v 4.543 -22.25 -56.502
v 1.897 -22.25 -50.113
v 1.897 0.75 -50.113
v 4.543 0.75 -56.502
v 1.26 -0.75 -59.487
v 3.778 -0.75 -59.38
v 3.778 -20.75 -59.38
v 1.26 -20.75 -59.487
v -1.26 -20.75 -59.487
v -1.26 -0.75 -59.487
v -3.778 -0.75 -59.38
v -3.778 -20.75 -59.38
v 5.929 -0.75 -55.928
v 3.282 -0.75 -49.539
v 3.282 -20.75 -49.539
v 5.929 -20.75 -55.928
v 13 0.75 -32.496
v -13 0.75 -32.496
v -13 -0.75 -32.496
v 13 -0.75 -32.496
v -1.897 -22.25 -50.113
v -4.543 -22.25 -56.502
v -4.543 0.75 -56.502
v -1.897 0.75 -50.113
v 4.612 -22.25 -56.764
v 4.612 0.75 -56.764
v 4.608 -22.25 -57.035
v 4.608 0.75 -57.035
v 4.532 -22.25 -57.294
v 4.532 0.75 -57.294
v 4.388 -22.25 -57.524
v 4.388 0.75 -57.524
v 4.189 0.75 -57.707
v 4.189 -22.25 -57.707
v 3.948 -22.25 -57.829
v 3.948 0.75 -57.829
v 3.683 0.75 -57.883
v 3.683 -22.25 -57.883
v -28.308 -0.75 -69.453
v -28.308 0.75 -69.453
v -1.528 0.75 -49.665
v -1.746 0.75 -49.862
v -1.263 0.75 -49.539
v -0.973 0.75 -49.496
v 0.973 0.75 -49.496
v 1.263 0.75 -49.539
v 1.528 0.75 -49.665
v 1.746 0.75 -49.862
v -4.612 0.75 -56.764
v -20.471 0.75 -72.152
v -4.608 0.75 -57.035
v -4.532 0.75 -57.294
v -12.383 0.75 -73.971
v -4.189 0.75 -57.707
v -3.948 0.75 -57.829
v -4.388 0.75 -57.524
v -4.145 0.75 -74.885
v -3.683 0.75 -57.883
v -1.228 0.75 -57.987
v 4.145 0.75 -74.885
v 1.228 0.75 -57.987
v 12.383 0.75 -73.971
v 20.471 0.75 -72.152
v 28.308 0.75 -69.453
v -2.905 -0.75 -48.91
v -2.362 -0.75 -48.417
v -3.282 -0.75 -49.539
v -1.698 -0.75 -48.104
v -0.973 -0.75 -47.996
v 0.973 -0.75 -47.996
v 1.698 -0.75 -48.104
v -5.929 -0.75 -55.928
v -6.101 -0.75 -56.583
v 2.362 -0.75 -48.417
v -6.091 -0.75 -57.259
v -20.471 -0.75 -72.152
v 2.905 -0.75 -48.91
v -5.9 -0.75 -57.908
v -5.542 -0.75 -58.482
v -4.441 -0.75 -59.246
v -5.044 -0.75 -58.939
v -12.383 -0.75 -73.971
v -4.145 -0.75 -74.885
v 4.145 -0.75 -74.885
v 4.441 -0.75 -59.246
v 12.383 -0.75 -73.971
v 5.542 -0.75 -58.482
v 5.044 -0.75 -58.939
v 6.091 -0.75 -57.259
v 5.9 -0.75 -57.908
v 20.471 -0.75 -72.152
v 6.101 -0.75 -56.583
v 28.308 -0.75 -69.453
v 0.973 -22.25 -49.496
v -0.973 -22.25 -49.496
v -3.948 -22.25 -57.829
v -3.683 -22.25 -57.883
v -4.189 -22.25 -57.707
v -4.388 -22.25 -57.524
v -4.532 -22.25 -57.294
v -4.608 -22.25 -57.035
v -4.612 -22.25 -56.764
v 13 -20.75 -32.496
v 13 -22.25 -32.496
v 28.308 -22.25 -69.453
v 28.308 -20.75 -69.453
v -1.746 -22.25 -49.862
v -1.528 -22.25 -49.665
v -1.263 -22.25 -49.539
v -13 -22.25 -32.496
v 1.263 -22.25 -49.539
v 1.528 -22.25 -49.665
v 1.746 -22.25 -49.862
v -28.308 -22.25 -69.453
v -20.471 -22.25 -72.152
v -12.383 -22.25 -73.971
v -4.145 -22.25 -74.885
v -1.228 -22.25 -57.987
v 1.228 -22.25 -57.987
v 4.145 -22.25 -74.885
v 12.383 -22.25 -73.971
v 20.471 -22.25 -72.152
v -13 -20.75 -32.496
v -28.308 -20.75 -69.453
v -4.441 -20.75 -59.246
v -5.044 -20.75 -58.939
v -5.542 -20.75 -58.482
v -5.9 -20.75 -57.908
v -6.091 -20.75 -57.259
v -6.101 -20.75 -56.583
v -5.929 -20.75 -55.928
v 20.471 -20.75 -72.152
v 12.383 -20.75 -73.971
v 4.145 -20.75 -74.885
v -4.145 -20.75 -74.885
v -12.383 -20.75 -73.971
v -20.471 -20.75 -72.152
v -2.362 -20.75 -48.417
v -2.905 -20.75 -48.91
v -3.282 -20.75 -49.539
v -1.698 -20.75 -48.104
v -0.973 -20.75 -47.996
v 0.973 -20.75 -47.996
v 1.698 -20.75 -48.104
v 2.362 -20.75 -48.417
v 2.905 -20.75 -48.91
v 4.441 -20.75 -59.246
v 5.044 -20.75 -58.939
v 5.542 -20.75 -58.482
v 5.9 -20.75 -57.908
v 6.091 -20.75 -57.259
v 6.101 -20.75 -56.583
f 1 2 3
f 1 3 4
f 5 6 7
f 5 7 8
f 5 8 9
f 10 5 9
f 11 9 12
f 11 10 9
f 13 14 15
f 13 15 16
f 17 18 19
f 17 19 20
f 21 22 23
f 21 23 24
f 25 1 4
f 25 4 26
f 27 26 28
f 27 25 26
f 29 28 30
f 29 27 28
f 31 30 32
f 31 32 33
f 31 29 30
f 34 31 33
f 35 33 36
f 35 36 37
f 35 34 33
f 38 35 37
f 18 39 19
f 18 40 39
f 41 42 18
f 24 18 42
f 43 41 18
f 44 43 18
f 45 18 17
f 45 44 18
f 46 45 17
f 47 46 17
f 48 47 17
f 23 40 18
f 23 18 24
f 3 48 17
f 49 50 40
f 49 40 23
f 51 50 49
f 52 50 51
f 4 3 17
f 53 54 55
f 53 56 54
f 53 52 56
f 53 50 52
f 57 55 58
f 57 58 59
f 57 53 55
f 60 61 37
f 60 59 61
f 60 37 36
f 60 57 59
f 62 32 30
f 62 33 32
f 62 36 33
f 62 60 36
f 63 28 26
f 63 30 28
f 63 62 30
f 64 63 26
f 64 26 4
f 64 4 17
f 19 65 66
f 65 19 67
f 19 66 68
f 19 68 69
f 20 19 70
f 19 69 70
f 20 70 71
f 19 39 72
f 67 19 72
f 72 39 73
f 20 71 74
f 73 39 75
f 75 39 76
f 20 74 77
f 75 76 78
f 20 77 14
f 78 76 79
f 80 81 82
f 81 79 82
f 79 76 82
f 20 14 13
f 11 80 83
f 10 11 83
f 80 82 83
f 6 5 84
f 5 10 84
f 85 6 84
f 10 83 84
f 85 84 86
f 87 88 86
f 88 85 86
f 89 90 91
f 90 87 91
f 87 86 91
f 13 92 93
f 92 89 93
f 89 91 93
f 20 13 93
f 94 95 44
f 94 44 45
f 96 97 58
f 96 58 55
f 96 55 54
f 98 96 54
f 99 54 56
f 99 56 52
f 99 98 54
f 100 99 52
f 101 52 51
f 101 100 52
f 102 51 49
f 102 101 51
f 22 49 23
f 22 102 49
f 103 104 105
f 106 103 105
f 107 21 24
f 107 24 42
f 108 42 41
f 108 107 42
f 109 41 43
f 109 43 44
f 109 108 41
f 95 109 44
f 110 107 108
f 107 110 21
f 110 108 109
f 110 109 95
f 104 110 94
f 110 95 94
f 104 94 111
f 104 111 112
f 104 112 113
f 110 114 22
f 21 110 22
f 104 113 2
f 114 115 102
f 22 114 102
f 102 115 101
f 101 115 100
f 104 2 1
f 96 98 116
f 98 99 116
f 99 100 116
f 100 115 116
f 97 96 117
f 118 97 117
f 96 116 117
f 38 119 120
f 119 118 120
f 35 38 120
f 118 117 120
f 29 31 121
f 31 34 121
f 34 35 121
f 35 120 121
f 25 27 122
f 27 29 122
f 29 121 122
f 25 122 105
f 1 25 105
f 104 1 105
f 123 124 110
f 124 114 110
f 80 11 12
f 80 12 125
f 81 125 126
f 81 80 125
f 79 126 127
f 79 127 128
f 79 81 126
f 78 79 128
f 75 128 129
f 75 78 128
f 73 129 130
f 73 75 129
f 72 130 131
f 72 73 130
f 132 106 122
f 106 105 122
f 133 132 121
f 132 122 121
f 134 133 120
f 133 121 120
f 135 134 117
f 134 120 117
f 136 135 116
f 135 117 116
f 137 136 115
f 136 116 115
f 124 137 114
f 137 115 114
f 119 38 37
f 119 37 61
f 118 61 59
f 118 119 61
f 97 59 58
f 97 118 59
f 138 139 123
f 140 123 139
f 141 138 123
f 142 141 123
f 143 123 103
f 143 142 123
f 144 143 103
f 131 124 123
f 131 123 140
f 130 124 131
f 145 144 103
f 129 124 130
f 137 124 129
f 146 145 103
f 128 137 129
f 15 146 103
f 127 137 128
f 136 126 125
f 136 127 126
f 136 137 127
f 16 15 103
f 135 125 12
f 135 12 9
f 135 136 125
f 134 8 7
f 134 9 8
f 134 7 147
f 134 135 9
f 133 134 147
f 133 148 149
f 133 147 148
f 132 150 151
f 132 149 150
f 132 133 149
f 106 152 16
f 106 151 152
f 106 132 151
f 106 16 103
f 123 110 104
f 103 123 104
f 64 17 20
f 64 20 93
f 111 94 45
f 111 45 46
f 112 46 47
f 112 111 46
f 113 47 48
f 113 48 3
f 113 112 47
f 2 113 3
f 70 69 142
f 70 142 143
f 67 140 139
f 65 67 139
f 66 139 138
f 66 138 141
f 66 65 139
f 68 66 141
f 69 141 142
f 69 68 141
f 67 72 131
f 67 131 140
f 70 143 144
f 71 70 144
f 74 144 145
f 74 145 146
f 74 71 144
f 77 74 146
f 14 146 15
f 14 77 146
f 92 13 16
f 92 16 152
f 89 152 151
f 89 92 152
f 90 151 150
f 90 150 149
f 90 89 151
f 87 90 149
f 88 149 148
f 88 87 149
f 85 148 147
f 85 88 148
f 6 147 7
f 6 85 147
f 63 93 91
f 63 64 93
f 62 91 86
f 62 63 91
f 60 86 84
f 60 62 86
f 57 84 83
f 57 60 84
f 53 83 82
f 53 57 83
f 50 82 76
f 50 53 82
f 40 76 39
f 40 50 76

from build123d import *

# Parameters (mm, degrees)
BOSS_EXTRUDE1_DEPTH = 0.75
BOSS_EXTRUDE2_DEPTH = 20


with BuildPart() as part:
    # Sketch1 → Boss-Extrude1 (new, symmetric)
    with BuildSketch(Plane(origin=(0, 0, 0), x_dir=(1, 0, 0), z_dir=(0, 1, 0))):
        with BuildLine():
            Line((-28.307864731, 69.452608262), (-13, 32.496153619))
            Line((-13, 32.496153619), (13, 32.496153619))
            Line((13, 32.496153619), (28.307864731, 69.452608262))
            ThreePointArc((28.307864731, 69.452608262), (0, 75), (-28.307864731, 69.452608262))
        make_face()
        with BuildLine():
            Line((-4.543006128, 56.502305121), (-1.89666405, 50.113470186))
            ThreePointArc((-1.89666405, 50.113470186), (-1.52835475, 49.664684006), (-0.972784517, 49.496153619))
            Line((-0.972784517, 49.496153619), (0.972784517, 49.496153619))
            ThreePointArc((0.972784517, 49.496153619), (1.52835475, 49.664684006), (1.89666405, 50.113470186))
            Line((1.89666405, 50.113470186), (4.543006128, 56.502305121))
            ThreePointArc((4.543006128, 56.502305121), (4.467823117, 57.413868704), (3.682620044, 57.882970808))
            ThreePointArc((3.682620044, 57.882970808), (0, 58), (-3.682620044, 57.882970808))
            ThreePointArc((-3.682620044, 57.882970808), (-4.467823117, 57.413868704), (-4.543006128, 56.502305121))
        make_face(mode=Mode.SUBTRACT)
    boss_extrude1 = extrude(amount=BOSS_EXTRUDE1_DEPTH, both=True)

    # Sketch2 → Boss-Extrude2 (add)
    with BuildSketch(Plane.XZ.offset(0.75)):
        with BuildLine():
            Line((-0.972784517, -47.996153619), (0.972784517, -47.996153619))
            ThreePointArc((0.972784517, -47.996153619), (2.3617101, -48.417479588), (3.282483349, -49.539445038))
            Line((3.282483349, -49.539445038), (5.928825426, -55.928279972))
            ThreePointArc((5.928825426, -55.928279972), (5.7408679, -58.207188929), (3.777860218, -59.379944191))
            ThreePointArc((3.777860218, -59.379944191), (0, -59.5), (-3.777860218, -59.379944191))
            ThreePointArc((-3.777860218, -59.379944191), (-5.7408679, -58.207188929), (-5.928825426, -55.928279972))
            Line((-5.928825426, -55.928279972), (-3.282483349, -49.539445038))
            ThreePointArc((-3.282483349, -49.539445038), (-2.3617101, -48.417479588), (-0.972784517, -47.996153619))
        make_face()
        with BuildLine():
            Line((1.89666405, -50.113470186), (4.543006128, -56.502305121))
            ThreePointArc((4.543006128, -56.502305121), (4.467823117, -57.413868704), (3.682620044, -57.882970808))
            ThreePointArc((3.682620044, -57.882970808), (0, -58), (-3.682620044, -57.882970808))
            ThreePointArc((-3.682620044, -57.882970808), (-4.467823117, -57.413868704), (-4.543006128, -56.502305121))
            Line((-4.543006128, -56.502305121), (-1.89666405, -50.113470186))
            ThreePointArc((-1.89666405, -50.113470186), (-1.52835475, -49.664684006), (-0.972784517, -49.496153619))
            Line((-0.972784517, -49.496153619), (0.972784517, -49.496153619))
            ThreePointArc((0.972784517, -49.496153619), (1.52835475, -49.664684006), (1.89666405, -50.113470186))
        make_face(mode=Mode.SUBTRACT)
    extrude(amount=BOSS_EXTRUDE2_DEPTH)

    # Mirror1: Boss-Extrude1 across plane
    add(boss_extrude1.mirror(Plane(origin=(0, -10.75, 0), x_dir=(0, 0, 1), z_dir=(0, -1, 0))))


solid = part.part
